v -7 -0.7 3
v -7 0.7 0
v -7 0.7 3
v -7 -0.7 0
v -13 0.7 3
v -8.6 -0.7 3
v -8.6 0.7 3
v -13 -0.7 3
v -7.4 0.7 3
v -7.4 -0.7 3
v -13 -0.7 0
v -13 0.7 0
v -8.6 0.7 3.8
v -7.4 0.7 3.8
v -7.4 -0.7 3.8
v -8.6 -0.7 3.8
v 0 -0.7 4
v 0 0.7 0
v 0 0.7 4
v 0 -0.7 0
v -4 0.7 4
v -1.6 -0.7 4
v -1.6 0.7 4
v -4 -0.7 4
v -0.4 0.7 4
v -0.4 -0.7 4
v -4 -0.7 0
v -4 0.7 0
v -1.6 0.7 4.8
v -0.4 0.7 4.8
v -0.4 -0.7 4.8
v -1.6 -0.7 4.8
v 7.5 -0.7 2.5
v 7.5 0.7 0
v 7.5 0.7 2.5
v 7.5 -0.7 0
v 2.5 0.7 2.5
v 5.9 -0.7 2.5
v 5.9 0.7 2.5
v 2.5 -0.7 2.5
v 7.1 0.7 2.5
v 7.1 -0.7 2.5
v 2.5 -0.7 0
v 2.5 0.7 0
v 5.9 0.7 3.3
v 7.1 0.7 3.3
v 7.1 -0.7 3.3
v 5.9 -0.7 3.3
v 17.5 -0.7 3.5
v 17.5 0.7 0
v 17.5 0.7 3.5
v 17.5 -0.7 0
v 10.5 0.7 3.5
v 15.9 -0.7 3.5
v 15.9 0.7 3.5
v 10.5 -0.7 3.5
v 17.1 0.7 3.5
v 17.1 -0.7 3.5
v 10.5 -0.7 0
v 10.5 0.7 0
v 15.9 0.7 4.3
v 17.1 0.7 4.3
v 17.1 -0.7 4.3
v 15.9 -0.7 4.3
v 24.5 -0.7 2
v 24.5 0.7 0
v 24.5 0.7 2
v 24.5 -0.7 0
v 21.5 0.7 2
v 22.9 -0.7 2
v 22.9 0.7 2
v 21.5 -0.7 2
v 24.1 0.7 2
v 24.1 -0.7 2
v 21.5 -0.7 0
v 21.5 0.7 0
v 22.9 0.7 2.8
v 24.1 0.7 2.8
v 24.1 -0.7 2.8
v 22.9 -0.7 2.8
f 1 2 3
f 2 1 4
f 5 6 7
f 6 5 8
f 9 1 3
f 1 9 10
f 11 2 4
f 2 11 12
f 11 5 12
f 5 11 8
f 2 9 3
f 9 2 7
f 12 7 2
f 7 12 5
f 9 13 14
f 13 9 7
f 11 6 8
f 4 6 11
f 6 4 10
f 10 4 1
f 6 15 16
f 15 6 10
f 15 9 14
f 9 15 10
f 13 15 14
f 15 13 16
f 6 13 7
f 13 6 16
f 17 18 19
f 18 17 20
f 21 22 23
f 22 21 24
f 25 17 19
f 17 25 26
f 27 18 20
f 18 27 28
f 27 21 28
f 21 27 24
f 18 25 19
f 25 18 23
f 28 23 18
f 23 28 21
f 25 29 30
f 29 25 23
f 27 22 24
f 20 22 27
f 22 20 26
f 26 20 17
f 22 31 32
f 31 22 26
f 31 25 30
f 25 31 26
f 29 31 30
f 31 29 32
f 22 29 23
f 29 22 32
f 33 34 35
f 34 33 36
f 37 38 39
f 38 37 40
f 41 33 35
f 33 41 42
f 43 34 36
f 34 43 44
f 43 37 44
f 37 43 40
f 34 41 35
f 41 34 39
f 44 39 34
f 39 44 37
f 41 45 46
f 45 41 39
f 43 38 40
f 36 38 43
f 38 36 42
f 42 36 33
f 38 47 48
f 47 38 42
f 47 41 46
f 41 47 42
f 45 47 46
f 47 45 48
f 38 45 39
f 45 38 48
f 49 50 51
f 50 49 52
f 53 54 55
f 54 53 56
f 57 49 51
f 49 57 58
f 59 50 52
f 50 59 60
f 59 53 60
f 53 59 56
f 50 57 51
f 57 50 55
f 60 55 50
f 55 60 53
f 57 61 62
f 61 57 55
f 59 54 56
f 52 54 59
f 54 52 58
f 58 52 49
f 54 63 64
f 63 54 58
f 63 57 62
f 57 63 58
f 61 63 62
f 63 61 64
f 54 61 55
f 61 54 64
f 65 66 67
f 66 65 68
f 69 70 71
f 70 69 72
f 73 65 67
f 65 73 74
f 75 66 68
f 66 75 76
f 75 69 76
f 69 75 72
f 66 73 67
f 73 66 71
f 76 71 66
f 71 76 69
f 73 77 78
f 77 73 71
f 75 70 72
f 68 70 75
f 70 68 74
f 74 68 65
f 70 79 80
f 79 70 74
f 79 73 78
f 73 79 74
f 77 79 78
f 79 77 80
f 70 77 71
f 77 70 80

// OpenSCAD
// 掩体矮墙 (battle_wall) — 枪战掩护资产
// 几段高低错落的断墙，可挡子弹、绕点
$fn = 6;

module wall_segment(len, h, x) {
  color([0.66, 0.63, 0.58]) translate([x, 0, h/2]) cube([len, 1.4, h], center = true);
  // 顶部破损小块
  color([0.60, 0.57, 0.52]) translate([x + len/2 - 1, 0, h + 0.4]) cube([1.2, 1.4, 0.8], center = true);
}

module cover_walls() {
  wall_segment(6, 3.0, -10);
  wall_segment(4, 4.0, -2);
  wall_segment(5, 2.5, 5);
  wall_segment(7, 3.5, 14);
  wall_segment(3, 2.0, 23);
}

cover_walls();
